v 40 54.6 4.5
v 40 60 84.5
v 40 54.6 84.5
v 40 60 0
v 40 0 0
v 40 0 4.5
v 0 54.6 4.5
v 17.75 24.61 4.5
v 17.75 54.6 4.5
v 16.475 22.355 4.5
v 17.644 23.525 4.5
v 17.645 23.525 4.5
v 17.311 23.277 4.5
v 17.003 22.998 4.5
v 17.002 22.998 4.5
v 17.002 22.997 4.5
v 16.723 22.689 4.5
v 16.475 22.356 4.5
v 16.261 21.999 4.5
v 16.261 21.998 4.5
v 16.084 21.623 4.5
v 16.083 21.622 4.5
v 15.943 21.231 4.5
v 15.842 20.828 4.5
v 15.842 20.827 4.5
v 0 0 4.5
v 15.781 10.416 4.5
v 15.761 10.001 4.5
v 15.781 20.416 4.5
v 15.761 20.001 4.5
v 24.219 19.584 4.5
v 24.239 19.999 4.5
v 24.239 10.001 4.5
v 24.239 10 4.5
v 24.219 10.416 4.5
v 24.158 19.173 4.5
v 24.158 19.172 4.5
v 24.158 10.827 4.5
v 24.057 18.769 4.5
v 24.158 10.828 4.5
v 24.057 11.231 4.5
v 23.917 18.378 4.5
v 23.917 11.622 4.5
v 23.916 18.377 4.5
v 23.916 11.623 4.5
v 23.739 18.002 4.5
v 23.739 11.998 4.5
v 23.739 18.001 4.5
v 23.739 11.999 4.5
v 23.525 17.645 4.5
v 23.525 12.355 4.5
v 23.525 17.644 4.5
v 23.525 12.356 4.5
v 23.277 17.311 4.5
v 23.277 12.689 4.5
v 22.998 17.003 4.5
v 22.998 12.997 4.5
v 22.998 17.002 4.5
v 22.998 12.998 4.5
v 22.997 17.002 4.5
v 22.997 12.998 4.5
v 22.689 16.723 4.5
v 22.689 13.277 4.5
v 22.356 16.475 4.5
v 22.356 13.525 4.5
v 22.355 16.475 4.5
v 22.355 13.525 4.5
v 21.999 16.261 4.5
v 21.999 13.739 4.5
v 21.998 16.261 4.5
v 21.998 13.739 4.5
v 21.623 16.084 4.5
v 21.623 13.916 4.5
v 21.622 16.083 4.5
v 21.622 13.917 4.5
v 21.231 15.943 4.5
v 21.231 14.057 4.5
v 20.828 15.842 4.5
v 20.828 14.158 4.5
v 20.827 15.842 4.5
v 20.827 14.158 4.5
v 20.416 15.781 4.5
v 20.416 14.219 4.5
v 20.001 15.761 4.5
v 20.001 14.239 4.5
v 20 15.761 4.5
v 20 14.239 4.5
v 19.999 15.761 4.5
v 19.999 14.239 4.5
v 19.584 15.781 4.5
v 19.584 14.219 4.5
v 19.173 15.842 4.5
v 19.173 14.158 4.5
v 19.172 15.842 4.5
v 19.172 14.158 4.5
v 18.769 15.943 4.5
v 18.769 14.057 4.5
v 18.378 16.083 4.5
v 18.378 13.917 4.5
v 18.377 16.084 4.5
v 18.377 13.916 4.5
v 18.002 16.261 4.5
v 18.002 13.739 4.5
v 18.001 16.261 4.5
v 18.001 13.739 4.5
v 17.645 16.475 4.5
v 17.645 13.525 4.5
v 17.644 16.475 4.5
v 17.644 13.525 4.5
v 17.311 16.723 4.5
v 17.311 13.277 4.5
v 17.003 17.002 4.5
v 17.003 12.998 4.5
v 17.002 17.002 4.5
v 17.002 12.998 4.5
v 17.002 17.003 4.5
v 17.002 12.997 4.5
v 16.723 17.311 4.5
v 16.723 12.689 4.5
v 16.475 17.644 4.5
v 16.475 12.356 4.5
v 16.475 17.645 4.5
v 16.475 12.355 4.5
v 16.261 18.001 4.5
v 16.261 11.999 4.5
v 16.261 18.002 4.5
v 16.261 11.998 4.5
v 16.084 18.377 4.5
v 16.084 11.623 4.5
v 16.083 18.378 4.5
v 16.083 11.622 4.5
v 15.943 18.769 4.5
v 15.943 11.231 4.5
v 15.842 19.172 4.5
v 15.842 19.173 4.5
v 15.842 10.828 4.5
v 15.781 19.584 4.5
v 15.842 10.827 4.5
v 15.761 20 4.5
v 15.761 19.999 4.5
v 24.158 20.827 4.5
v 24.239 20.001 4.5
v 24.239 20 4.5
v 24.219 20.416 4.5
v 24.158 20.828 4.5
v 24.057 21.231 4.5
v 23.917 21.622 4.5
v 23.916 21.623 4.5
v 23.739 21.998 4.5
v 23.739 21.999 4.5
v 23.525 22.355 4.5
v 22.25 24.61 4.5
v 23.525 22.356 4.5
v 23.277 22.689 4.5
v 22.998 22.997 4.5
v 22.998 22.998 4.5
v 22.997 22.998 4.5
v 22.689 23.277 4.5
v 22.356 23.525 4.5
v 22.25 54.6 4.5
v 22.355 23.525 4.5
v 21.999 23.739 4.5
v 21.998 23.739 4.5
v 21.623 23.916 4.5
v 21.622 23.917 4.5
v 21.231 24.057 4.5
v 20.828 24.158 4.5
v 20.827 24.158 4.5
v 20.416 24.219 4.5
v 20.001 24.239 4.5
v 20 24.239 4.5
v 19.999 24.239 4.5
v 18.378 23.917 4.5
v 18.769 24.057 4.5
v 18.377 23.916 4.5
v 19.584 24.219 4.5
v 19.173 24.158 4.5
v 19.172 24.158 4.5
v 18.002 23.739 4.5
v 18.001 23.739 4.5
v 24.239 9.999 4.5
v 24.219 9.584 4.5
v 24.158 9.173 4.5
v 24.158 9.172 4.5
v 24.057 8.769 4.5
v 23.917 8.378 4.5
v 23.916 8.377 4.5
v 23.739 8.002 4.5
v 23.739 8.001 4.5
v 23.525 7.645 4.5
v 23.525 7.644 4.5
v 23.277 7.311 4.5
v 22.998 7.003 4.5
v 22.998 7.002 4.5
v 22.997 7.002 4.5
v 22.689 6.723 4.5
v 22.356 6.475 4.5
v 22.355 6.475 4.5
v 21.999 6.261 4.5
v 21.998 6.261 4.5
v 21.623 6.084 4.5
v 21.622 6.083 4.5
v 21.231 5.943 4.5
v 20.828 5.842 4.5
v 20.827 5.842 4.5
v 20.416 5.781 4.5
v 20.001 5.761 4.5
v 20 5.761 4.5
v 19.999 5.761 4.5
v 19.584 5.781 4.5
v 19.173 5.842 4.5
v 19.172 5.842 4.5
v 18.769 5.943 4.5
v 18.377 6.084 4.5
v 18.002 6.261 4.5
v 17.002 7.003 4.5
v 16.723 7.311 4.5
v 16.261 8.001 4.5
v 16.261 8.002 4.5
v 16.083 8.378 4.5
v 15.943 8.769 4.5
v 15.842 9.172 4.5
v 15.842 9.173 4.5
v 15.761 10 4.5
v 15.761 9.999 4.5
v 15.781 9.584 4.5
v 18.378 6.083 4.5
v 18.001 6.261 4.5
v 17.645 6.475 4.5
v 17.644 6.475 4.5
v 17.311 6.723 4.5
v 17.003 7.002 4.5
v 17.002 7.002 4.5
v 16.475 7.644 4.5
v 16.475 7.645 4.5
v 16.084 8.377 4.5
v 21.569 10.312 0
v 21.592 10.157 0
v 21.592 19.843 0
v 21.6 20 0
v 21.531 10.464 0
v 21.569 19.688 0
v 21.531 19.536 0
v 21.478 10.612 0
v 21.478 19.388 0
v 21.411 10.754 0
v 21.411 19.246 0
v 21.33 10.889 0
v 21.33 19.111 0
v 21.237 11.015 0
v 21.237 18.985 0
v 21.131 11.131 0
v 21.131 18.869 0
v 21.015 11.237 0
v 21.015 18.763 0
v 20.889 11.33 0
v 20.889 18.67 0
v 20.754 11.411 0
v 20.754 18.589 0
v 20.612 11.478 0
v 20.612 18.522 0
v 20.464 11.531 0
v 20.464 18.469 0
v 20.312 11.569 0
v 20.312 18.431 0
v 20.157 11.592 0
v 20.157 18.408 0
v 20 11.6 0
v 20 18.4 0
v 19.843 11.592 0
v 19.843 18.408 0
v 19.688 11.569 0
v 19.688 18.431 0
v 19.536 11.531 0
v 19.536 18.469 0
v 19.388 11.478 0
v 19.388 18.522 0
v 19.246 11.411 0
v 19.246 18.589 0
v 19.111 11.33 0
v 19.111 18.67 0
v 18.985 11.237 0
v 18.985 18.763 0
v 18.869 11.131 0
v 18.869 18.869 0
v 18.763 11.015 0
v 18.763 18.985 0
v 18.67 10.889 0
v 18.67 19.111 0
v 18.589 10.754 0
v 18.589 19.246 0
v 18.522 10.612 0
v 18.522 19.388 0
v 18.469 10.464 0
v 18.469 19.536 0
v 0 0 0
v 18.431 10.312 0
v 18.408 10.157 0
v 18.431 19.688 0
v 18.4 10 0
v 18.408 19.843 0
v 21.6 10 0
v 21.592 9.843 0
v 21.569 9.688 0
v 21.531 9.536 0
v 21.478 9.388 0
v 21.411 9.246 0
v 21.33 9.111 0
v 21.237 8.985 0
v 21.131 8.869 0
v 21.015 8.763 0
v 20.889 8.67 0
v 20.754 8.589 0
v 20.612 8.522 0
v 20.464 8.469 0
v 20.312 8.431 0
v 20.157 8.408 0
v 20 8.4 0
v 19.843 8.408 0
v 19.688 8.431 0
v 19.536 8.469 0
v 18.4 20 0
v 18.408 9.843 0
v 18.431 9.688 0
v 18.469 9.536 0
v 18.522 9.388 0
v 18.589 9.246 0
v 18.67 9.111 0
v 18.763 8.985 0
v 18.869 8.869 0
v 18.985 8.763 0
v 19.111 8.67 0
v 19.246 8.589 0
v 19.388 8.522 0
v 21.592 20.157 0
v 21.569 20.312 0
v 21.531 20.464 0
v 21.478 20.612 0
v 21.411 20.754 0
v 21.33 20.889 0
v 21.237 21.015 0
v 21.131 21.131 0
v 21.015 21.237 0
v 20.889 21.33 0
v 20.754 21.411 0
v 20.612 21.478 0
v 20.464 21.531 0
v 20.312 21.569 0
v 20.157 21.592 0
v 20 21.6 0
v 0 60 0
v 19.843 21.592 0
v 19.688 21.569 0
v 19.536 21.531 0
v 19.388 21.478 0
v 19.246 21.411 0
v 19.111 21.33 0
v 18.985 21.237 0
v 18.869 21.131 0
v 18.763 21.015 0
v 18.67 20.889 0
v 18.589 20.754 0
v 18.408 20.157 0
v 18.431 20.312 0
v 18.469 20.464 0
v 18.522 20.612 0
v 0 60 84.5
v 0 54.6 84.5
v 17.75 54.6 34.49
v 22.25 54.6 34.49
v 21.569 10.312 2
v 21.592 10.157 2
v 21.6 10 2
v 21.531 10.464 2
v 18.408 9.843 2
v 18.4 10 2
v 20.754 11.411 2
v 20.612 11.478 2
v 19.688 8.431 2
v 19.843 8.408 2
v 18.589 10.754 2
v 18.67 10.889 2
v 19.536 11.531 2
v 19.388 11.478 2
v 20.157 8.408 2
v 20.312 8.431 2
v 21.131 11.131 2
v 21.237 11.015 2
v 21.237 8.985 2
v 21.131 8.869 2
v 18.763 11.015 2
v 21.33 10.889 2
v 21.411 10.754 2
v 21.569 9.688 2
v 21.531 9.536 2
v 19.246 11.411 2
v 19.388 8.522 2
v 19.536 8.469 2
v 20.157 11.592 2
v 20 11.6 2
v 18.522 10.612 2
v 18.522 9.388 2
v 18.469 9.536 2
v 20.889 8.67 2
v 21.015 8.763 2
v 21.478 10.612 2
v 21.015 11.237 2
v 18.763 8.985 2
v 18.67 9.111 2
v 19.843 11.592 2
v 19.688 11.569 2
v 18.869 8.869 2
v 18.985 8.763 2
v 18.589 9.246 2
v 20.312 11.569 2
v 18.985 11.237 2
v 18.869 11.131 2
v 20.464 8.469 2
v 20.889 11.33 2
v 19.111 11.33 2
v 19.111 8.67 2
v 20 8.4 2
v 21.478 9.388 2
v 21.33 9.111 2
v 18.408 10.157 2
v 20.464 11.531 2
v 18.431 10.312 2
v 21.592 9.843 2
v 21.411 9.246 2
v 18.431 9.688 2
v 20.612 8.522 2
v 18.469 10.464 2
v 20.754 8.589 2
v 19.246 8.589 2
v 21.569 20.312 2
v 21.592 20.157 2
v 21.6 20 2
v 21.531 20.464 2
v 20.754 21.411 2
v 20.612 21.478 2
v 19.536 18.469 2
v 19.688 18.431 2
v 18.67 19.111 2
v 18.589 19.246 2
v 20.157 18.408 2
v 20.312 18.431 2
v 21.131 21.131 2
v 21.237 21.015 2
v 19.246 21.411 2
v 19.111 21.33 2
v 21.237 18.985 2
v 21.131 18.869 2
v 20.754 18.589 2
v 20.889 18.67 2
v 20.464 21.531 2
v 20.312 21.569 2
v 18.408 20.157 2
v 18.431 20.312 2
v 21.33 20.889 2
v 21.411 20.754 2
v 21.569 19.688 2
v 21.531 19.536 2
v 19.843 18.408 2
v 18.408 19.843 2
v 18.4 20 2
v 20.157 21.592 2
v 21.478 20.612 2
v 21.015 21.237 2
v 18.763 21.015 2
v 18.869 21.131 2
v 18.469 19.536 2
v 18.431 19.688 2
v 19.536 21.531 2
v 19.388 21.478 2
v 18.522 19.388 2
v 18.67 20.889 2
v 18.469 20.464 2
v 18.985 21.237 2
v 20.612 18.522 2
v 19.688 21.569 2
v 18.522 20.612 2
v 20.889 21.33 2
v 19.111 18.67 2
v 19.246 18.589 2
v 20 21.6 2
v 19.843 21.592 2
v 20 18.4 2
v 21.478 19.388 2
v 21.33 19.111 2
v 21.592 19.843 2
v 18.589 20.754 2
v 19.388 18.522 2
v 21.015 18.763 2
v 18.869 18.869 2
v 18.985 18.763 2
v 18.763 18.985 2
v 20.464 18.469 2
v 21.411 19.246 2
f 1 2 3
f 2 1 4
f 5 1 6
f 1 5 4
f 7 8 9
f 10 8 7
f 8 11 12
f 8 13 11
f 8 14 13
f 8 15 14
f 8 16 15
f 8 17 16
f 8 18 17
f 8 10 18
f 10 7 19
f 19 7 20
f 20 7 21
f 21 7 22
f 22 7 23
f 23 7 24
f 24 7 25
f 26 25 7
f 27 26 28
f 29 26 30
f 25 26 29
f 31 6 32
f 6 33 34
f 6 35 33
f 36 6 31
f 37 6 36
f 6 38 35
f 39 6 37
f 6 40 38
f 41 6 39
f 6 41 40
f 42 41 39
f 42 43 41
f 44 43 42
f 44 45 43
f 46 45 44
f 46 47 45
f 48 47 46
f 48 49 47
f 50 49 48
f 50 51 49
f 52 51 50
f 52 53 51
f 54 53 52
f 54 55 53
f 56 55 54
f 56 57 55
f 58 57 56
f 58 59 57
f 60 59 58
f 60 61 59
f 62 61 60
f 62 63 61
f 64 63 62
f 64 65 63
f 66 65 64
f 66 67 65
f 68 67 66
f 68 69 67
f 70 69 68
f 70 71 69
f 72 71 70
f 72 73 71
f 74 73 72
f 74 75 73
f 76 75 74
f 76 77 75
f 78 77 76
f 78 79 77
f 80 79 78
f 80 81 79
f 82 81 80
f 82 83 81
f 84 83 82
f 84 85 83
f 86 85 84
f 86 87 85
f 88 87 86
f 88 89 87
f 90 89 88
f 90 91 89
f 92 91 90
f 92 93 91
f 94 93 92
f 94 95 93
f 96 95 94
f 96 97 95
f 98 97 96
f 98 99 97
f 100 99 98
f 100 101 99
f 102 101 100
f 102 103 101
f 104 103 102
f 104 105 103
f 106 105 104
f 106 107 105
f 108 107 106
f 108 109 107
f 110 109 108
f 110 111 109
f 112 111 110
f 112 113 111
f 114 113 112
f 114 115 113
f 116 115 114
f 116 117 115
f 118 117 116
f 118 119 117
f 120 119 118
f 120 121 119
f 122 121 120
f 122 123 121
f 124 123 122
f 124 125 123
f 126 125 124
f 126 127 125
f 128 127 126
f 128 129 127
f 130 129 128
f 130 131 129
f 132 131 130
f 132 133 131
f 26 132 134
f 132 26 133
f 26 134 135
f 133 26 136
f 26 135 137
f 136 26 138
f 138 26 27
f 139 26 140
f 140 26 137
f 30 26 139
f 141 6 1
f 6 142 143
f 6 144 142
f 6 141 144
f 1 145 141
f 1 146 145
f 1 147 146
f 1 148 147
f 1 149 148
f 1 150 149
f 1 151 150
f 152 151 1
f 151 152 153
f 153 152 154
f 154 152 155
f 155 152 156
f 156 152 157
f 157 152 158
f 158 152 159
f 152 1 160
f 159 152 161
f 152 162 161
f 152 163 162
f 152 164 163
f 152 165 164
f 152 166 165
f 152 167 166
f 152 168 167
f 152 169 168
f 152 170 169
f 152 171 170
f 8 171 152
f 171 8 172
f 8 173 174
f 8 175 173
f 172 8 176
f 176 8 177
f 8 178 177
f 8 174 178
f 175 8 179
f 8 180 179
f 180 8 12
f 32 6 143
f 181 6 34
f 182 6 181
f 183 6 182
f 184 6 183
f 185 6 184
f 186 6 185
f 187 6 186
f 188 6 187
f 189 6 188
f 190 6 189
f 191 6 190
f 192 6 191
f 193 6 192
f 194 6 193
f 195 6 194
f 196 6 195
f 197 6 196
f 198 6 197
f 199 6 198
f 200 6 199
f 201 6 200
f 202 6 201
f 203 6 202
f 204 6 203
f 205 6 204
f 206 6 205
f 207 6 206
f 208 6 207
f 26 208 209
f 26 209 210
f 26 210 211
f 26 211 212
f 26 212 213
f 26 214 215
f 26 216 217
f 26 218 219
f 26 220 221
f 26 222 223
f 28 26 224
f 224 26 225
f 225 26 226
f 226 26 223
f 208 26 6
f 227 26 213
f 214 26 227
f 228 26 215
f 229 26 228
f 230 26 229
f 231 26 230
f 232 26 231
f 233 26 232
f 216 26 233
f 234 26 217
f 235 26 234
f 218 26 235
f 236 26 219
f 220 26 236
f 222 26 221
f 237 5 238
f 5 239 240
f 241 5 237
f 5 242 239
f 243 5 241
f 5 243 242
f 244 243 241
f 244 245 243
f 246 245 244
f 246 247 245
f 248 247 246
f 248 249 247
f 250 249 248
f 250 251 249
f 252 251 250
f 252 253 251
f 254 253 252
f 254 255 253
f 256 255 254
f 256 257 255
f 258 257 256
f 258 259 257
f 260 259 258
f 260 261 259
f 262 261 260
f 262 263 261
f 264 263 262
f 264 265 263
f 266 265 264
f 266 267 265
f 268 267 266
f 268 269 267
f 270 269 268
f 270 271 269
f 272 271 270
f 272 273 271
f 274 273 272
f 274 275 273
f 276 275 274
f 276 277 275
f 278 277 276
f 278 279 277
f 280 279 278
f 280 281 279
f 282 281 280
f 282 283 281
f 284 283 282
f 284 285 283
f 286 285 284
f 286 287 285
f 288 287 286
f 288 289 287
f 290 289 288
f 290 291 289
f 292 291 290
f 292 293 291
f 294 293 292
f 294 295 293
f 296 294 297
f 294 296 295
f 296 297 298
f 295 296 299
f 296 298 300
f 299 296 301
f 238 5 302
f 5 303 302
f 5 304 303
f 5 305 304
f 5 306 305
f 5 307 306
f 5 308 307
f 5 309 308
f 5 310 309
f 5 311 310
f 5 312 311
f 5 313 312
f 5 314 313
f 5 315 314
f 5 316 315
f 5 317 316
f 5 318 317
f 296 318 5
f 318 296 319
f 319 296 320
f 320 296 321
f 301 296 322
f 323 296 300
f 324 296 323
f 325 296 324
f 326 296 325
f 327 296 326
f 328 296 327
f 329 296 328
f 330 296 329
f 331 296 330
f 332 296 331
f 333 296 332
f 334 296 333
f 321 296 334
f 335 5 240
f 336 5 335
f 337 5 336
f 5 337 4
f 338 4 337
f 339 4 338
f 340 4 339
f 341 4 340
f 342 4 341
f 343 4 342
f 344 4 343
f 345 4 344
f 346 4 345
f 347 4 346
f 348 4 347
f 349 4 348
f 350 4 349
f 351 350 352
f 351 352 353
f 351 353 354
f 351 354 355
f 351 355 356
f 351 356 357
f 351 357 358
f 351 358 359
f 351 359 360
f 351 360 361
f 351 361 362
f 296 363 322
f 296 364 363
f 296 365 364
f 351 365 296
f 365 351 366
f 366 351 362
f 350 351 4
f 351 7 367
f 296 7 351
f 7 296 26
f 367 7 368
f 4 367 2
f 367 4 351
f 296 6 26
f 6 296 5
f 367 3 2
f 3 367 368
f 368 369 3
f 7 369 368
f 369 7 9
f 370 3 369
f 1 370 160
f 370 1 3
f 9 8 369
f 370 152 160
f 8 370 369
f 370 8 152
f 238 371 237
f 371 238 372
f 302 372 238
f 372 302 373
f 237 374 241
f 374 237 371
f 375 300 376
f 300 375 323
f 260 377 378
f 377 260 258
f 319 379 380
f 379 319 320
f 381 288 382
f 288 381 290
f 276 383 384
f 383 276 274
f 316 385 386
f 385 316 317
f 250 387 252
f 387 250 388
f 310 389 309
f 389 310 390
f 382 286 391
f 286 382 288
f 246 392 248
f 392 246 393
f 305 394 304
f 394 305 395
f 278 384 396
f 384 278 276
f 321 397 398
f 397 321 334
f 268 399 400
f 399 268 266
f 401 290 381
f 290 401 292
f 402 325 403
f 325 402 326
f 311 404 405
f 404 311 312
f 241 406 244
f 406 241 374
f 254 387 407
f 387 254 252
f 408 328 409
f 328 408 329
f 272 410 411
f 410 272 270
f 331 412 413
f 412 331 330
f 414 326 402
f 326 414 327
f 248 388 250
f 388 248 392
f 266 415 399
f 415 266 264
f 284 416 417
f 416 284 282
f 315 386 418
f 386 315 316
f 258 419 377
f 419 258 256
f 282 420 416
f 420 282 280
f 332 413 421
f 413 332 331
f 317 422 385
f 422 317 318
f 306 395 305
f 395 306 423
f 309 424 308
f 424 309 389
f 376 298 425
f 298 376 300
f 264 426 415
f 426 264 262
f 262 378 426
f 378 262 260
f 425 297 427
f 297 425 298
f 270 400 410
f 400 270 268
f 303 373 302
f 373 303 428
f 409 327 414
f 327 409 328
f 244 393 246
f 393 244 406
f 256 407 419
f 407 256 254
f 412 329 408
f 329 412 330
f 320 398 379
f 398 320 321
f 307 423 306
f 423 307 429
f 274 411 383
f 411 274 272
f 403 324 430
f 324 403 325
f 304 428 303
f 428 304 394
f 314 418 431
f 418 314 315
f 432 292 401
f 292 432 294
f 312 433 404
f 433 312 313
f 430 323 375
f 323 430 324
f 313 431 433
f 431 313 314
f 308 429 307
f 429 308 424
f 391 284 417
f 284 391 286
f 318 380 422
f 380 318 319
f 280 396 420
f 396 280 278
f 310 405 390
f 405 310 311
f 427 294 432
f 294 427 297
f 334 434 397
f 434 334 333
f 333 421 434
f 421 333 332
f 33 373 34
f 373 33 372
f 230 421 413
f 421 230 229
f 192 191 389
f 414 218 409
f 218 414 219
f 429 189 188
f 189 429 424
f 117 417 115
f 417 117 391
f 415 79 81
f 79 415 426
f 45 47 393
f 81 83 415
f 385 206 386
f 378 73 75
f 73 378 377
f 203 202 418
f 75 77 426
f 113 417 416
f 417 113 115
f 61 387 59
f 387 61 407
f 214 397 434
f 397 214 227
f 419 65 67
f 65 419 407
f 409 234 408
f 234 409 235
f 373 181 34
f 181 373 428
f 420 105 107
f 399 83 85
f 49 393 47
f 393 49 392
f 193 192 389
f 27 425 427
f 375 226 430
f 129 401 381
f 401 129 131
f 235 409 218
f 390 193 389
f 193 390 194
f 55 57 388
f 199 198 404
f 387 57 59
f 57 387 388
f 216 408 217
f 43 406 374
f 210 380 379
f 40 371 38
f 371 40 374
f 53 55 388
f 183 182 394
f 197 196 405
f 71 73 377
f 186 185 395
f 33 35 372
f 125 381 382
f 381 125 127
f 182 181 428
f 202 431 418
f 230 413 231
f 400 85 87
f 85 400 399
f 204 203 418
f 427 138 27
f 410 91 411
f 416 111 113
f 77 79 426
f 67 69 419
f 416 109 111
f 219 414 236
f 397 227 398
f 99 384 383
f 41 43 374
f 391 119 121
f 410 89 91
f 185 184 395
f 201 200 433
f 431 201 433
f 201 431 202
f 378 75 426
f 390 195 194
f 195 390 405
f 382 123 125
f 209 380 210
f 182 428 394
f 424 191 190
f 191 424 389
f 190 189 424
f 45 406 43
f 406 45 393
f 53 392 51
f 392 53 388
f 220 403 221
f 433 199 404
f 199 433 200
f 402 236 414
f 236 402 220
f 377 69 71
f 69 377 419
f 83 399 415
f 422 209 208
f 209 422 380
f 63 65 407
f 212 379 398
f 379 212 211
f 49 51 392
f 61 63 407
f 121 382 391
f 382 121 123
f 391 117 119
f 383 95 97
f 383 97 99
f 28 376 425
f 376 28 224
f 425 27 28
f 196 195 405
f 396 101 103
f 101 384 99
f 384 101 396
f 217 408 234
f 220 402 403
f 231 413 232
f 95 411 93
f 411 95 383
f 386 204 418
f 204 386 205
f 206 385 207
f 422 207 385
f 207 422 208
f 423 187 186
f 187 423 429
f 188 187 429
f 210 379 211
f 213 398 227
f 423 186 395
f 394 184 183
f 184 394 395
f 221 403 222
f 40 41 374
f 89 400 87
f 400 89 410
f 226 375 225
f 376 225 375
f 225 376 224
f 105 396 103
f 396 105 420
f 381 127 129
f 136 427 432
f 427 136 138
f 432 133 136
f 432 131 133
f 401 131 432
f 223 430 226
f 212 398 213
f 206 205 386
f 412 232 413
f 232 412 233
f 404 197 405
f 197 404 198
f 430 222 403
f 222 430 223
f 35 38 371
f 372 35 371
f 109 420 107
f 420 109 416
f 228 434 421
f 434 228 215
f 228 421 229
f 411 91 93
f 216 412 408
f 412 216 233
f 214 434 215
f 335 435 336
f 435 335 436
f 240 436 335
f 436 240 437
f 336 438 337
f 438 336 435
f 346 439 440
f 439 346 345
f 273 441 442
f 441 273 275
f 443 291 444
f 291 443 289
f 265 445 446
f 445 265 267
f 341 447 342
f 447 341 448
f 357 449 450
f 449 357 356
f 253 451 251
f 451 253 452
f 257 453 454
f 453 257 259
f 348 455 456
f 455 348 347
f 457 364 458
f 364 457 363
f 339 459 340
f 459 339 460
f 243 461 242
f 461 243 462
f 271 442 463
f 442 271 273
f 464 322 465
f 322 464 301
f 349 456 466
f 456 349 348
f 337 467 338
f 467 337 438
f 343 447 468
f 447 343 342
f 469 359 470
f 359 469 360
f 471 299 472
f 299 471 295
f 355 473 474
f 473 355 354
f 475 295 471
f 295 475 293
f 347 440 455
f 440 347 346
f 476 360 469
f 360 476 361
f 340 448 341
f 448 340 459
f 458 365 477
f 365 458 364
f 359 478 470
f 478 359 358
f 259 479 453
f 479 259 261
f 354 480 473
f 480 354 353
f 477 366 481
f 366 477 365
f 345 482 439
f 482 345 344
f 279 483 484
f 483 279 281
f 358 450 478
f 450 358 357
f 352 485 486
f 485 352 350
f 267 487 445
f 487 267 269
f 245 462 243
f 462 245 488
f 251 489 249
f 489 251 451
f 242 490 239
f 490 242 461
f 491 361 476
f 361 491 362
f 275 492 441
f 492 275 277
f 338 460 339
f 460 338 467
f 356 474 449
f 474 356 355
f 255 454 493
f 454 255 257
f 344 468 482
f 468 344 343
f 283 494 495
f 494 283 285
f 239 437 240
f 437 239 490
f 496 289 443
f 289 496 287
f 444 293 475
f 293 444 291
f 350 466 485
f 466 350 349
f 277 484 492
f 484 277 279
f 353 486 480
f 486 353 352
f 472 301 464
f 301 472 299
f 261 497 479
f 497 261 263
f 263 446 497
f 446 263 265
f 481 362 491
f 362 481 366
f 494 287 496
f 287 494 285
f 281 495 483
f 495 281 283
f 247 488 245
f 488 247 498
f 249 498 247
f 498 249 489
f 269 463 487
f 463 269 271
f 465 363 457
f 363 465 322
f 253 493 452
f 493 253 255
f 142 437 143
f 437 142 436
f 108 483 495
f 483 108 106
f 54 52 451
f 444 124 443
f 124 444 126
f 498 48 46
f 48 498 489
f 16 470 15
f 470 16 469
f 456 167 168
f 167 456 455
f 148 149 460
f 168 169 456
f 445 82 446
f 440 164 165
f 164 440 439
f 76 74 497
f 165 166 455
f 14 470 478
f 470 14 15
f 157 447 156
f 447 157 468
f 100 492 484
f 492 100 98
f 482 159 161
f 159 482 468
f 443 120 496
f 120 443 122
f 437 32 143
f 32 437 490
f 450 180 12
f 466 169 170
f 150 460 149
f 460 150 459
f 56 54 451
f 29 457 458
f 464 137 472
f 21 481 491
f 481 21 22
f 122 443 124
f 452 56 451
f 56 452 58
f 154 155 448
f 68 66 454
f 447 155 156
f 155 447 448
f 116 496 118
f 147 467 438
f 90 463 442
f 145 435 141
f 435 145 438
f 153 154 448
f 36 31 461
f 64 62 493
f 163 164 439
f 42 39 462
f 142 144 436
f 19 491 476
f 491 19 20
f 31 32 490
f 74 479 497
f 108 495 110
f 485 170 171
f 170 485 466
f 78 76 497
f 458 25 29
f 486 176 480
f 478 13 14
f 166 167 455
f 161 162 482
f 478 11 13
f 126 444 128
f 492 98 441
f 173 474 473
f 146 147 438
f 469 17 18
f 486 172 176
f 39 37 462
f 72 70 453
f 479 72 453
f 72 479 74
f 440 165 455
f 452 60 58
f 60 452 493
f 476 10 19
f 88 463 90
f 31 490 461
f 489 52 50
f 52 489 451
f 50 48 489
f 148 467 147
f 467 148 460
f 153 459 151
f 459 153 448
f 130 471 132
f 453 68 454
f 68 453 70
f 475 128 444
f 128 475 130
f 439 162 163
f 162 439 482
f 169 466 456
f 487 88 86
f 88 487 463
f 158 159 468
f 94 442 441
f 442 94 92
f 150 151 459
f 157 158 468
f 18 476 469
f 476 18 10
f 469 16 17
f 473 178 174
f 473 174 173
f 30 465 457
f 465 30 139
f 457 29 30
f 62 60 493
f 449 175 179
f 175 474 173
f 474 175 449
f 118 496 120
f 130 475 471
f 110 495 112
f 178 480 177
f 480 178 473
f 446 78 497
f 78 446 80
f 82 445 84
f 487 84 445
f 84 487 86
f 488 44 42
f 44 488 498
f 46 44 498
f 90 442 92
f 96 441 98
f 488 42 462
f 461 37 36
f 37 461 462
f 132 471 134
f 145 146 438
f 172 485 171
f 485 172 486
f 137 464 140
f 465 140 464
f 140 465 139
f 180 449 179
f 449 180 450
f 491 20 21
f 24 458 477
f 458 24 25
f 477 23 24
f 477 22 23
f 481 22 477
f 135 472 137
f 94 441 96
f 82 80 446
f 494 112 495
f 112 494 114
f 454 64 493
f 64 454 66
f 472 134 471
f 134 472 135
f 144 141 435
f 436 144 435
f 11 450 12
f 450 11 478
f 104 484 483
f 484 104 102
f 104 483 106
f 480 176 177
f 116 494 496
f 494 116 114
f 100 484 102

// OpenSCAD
// === DESCRIPTION ===
// Shelf bracket: an L-bracket that screws to a wall stud and carries one end of a
// 200 mm deep timber shelf of books (about 8 kg per bracket).
// Physical context: indoors, fixed with two 4 mm countersunk wood screws; the
//   shelf board rests on the arm, so the arm is loaded in bending at its root.
//
// Design decisions:
//   - Printed with the wall plate flat on the bed: the biggest flat face gives the
//     best adhesion and the arm rises straight up with no overhang.
//   - A triangular gusset stiffens the arm-to-plate joint.
//   - Screw holes are vertical in print orientation, so they need no teardrop.
//
// Terminology → code:
//   "wall plate"  → plate_w, plate_h, plate_t, wall_plate()
//   "arm"         → arm_len, arm_t, arm()
//   "gusset"      → gusset_len, gusset_t, gusset()
//   "screw holes" → screw_d, head_d, head_depth, screw_hole(), hole_y
//
// Common modifications:
//   Longer arm     → arm_len (keep gusset_len >= arm_len / 3)
//   Thicker parts  → plate_t, arm_t (whole multiples of extrusion_width)
//   Other screws   → screw_d, head_d
//
// Overall dimensions: 40 x 60 x 84.5 mm (fits a Bambu P1S, 256^3)
// Coordinate system: X = bracket width, Y = up the wall in use, Z = height off the bed
// NOTE: Model is in print orientation. In use, Z points out of the wall and the
//   arm is horizontal.

// === PRINT SETTINGS ===
// Material: PETG (tough, won't creep under a constant shelf load like PLA)
// Layer Height: 0.2mm
// Walls/Perimeters: 4 (1.8mm)
// Infill: 40% gyroid
// Supports: None required
// Orientation: As modeled, wall plate flat on the bed, arm pointing up
// Notes: Dry PETG before printing

// === PARAMETERS ===
nozzle_diameter = 0.4;
layer_height = 0.2;

plate_w = 40;          // bracket width
plate_h = 60;          // wall plate height (in use)
plate_t = 4.5;         // wall plate thickness
arm_len = 80;          // arm length (shelf depth support)
arm_t = 5.4;           // arm thickness
gusset_len = 30;       // gusset leg length
gusset_t = 4.5;        // gusset thickness
screw_d = 3.2;         // clearance hole for the 4 mm wood screws
head_d = 8.5;          // countersink diameter at the surface
head_depth = 2.5;      // countersink depth
hole_y = [10, 20];     // screw positions up the plate

// === DERIVED CONSTANTS ===
extrusion_width = nozzle_diameter * 1.125;
fudge = 0.01;
ef_chamfer = 0.4;
$fn = $preview ? 32 : 64;

assert(arm_len >= 75, "arm must support a 200 mm shelf at 75 mm or more");
assert(hole_y[1] + head_d / 2 < plate_h - arm_t - gusset_len, "screw heads clear the gusset");

// === MODULES ===
module wall_plate() cube([plate_w, plate_h, plate_t]);

module arm() translate([0, plate_h - arm_t, plate_t - fudge]) cube([plate_w, arm_t, arm_len + fudge]);

module gusset()
    translate([(plate_w - gusset_t) / 2, 0, 0])
        rotate([90, 0, 90])
            linear_extrude(gusset_t)
                polygon([[plate_h - arm_t + fudge, plate_t - fudge],
                         [plate_h - arm_t - gusset_len, plate_t - fudge],
                         [plate_h - arm_t + fudge, plate_t + gusset_len]]);

module screw_hole(y)
    translate([plate_w / 2, y, -fudge]) {
        cylinder(d = screw_d, h = plate_t + 2 * fudge);
        translate([0, 0, plate_t - head_depth + fudge])
            cylinder(d1 = screw_d, d2 = head_d, h = head_depth + fudge);
    }

// === ASSEMBLY / RENDER ===
difference() {
    union() { wall_plate(); arm(); gusset(); }
    for (y = hole_y) screw_hole(y);
}
